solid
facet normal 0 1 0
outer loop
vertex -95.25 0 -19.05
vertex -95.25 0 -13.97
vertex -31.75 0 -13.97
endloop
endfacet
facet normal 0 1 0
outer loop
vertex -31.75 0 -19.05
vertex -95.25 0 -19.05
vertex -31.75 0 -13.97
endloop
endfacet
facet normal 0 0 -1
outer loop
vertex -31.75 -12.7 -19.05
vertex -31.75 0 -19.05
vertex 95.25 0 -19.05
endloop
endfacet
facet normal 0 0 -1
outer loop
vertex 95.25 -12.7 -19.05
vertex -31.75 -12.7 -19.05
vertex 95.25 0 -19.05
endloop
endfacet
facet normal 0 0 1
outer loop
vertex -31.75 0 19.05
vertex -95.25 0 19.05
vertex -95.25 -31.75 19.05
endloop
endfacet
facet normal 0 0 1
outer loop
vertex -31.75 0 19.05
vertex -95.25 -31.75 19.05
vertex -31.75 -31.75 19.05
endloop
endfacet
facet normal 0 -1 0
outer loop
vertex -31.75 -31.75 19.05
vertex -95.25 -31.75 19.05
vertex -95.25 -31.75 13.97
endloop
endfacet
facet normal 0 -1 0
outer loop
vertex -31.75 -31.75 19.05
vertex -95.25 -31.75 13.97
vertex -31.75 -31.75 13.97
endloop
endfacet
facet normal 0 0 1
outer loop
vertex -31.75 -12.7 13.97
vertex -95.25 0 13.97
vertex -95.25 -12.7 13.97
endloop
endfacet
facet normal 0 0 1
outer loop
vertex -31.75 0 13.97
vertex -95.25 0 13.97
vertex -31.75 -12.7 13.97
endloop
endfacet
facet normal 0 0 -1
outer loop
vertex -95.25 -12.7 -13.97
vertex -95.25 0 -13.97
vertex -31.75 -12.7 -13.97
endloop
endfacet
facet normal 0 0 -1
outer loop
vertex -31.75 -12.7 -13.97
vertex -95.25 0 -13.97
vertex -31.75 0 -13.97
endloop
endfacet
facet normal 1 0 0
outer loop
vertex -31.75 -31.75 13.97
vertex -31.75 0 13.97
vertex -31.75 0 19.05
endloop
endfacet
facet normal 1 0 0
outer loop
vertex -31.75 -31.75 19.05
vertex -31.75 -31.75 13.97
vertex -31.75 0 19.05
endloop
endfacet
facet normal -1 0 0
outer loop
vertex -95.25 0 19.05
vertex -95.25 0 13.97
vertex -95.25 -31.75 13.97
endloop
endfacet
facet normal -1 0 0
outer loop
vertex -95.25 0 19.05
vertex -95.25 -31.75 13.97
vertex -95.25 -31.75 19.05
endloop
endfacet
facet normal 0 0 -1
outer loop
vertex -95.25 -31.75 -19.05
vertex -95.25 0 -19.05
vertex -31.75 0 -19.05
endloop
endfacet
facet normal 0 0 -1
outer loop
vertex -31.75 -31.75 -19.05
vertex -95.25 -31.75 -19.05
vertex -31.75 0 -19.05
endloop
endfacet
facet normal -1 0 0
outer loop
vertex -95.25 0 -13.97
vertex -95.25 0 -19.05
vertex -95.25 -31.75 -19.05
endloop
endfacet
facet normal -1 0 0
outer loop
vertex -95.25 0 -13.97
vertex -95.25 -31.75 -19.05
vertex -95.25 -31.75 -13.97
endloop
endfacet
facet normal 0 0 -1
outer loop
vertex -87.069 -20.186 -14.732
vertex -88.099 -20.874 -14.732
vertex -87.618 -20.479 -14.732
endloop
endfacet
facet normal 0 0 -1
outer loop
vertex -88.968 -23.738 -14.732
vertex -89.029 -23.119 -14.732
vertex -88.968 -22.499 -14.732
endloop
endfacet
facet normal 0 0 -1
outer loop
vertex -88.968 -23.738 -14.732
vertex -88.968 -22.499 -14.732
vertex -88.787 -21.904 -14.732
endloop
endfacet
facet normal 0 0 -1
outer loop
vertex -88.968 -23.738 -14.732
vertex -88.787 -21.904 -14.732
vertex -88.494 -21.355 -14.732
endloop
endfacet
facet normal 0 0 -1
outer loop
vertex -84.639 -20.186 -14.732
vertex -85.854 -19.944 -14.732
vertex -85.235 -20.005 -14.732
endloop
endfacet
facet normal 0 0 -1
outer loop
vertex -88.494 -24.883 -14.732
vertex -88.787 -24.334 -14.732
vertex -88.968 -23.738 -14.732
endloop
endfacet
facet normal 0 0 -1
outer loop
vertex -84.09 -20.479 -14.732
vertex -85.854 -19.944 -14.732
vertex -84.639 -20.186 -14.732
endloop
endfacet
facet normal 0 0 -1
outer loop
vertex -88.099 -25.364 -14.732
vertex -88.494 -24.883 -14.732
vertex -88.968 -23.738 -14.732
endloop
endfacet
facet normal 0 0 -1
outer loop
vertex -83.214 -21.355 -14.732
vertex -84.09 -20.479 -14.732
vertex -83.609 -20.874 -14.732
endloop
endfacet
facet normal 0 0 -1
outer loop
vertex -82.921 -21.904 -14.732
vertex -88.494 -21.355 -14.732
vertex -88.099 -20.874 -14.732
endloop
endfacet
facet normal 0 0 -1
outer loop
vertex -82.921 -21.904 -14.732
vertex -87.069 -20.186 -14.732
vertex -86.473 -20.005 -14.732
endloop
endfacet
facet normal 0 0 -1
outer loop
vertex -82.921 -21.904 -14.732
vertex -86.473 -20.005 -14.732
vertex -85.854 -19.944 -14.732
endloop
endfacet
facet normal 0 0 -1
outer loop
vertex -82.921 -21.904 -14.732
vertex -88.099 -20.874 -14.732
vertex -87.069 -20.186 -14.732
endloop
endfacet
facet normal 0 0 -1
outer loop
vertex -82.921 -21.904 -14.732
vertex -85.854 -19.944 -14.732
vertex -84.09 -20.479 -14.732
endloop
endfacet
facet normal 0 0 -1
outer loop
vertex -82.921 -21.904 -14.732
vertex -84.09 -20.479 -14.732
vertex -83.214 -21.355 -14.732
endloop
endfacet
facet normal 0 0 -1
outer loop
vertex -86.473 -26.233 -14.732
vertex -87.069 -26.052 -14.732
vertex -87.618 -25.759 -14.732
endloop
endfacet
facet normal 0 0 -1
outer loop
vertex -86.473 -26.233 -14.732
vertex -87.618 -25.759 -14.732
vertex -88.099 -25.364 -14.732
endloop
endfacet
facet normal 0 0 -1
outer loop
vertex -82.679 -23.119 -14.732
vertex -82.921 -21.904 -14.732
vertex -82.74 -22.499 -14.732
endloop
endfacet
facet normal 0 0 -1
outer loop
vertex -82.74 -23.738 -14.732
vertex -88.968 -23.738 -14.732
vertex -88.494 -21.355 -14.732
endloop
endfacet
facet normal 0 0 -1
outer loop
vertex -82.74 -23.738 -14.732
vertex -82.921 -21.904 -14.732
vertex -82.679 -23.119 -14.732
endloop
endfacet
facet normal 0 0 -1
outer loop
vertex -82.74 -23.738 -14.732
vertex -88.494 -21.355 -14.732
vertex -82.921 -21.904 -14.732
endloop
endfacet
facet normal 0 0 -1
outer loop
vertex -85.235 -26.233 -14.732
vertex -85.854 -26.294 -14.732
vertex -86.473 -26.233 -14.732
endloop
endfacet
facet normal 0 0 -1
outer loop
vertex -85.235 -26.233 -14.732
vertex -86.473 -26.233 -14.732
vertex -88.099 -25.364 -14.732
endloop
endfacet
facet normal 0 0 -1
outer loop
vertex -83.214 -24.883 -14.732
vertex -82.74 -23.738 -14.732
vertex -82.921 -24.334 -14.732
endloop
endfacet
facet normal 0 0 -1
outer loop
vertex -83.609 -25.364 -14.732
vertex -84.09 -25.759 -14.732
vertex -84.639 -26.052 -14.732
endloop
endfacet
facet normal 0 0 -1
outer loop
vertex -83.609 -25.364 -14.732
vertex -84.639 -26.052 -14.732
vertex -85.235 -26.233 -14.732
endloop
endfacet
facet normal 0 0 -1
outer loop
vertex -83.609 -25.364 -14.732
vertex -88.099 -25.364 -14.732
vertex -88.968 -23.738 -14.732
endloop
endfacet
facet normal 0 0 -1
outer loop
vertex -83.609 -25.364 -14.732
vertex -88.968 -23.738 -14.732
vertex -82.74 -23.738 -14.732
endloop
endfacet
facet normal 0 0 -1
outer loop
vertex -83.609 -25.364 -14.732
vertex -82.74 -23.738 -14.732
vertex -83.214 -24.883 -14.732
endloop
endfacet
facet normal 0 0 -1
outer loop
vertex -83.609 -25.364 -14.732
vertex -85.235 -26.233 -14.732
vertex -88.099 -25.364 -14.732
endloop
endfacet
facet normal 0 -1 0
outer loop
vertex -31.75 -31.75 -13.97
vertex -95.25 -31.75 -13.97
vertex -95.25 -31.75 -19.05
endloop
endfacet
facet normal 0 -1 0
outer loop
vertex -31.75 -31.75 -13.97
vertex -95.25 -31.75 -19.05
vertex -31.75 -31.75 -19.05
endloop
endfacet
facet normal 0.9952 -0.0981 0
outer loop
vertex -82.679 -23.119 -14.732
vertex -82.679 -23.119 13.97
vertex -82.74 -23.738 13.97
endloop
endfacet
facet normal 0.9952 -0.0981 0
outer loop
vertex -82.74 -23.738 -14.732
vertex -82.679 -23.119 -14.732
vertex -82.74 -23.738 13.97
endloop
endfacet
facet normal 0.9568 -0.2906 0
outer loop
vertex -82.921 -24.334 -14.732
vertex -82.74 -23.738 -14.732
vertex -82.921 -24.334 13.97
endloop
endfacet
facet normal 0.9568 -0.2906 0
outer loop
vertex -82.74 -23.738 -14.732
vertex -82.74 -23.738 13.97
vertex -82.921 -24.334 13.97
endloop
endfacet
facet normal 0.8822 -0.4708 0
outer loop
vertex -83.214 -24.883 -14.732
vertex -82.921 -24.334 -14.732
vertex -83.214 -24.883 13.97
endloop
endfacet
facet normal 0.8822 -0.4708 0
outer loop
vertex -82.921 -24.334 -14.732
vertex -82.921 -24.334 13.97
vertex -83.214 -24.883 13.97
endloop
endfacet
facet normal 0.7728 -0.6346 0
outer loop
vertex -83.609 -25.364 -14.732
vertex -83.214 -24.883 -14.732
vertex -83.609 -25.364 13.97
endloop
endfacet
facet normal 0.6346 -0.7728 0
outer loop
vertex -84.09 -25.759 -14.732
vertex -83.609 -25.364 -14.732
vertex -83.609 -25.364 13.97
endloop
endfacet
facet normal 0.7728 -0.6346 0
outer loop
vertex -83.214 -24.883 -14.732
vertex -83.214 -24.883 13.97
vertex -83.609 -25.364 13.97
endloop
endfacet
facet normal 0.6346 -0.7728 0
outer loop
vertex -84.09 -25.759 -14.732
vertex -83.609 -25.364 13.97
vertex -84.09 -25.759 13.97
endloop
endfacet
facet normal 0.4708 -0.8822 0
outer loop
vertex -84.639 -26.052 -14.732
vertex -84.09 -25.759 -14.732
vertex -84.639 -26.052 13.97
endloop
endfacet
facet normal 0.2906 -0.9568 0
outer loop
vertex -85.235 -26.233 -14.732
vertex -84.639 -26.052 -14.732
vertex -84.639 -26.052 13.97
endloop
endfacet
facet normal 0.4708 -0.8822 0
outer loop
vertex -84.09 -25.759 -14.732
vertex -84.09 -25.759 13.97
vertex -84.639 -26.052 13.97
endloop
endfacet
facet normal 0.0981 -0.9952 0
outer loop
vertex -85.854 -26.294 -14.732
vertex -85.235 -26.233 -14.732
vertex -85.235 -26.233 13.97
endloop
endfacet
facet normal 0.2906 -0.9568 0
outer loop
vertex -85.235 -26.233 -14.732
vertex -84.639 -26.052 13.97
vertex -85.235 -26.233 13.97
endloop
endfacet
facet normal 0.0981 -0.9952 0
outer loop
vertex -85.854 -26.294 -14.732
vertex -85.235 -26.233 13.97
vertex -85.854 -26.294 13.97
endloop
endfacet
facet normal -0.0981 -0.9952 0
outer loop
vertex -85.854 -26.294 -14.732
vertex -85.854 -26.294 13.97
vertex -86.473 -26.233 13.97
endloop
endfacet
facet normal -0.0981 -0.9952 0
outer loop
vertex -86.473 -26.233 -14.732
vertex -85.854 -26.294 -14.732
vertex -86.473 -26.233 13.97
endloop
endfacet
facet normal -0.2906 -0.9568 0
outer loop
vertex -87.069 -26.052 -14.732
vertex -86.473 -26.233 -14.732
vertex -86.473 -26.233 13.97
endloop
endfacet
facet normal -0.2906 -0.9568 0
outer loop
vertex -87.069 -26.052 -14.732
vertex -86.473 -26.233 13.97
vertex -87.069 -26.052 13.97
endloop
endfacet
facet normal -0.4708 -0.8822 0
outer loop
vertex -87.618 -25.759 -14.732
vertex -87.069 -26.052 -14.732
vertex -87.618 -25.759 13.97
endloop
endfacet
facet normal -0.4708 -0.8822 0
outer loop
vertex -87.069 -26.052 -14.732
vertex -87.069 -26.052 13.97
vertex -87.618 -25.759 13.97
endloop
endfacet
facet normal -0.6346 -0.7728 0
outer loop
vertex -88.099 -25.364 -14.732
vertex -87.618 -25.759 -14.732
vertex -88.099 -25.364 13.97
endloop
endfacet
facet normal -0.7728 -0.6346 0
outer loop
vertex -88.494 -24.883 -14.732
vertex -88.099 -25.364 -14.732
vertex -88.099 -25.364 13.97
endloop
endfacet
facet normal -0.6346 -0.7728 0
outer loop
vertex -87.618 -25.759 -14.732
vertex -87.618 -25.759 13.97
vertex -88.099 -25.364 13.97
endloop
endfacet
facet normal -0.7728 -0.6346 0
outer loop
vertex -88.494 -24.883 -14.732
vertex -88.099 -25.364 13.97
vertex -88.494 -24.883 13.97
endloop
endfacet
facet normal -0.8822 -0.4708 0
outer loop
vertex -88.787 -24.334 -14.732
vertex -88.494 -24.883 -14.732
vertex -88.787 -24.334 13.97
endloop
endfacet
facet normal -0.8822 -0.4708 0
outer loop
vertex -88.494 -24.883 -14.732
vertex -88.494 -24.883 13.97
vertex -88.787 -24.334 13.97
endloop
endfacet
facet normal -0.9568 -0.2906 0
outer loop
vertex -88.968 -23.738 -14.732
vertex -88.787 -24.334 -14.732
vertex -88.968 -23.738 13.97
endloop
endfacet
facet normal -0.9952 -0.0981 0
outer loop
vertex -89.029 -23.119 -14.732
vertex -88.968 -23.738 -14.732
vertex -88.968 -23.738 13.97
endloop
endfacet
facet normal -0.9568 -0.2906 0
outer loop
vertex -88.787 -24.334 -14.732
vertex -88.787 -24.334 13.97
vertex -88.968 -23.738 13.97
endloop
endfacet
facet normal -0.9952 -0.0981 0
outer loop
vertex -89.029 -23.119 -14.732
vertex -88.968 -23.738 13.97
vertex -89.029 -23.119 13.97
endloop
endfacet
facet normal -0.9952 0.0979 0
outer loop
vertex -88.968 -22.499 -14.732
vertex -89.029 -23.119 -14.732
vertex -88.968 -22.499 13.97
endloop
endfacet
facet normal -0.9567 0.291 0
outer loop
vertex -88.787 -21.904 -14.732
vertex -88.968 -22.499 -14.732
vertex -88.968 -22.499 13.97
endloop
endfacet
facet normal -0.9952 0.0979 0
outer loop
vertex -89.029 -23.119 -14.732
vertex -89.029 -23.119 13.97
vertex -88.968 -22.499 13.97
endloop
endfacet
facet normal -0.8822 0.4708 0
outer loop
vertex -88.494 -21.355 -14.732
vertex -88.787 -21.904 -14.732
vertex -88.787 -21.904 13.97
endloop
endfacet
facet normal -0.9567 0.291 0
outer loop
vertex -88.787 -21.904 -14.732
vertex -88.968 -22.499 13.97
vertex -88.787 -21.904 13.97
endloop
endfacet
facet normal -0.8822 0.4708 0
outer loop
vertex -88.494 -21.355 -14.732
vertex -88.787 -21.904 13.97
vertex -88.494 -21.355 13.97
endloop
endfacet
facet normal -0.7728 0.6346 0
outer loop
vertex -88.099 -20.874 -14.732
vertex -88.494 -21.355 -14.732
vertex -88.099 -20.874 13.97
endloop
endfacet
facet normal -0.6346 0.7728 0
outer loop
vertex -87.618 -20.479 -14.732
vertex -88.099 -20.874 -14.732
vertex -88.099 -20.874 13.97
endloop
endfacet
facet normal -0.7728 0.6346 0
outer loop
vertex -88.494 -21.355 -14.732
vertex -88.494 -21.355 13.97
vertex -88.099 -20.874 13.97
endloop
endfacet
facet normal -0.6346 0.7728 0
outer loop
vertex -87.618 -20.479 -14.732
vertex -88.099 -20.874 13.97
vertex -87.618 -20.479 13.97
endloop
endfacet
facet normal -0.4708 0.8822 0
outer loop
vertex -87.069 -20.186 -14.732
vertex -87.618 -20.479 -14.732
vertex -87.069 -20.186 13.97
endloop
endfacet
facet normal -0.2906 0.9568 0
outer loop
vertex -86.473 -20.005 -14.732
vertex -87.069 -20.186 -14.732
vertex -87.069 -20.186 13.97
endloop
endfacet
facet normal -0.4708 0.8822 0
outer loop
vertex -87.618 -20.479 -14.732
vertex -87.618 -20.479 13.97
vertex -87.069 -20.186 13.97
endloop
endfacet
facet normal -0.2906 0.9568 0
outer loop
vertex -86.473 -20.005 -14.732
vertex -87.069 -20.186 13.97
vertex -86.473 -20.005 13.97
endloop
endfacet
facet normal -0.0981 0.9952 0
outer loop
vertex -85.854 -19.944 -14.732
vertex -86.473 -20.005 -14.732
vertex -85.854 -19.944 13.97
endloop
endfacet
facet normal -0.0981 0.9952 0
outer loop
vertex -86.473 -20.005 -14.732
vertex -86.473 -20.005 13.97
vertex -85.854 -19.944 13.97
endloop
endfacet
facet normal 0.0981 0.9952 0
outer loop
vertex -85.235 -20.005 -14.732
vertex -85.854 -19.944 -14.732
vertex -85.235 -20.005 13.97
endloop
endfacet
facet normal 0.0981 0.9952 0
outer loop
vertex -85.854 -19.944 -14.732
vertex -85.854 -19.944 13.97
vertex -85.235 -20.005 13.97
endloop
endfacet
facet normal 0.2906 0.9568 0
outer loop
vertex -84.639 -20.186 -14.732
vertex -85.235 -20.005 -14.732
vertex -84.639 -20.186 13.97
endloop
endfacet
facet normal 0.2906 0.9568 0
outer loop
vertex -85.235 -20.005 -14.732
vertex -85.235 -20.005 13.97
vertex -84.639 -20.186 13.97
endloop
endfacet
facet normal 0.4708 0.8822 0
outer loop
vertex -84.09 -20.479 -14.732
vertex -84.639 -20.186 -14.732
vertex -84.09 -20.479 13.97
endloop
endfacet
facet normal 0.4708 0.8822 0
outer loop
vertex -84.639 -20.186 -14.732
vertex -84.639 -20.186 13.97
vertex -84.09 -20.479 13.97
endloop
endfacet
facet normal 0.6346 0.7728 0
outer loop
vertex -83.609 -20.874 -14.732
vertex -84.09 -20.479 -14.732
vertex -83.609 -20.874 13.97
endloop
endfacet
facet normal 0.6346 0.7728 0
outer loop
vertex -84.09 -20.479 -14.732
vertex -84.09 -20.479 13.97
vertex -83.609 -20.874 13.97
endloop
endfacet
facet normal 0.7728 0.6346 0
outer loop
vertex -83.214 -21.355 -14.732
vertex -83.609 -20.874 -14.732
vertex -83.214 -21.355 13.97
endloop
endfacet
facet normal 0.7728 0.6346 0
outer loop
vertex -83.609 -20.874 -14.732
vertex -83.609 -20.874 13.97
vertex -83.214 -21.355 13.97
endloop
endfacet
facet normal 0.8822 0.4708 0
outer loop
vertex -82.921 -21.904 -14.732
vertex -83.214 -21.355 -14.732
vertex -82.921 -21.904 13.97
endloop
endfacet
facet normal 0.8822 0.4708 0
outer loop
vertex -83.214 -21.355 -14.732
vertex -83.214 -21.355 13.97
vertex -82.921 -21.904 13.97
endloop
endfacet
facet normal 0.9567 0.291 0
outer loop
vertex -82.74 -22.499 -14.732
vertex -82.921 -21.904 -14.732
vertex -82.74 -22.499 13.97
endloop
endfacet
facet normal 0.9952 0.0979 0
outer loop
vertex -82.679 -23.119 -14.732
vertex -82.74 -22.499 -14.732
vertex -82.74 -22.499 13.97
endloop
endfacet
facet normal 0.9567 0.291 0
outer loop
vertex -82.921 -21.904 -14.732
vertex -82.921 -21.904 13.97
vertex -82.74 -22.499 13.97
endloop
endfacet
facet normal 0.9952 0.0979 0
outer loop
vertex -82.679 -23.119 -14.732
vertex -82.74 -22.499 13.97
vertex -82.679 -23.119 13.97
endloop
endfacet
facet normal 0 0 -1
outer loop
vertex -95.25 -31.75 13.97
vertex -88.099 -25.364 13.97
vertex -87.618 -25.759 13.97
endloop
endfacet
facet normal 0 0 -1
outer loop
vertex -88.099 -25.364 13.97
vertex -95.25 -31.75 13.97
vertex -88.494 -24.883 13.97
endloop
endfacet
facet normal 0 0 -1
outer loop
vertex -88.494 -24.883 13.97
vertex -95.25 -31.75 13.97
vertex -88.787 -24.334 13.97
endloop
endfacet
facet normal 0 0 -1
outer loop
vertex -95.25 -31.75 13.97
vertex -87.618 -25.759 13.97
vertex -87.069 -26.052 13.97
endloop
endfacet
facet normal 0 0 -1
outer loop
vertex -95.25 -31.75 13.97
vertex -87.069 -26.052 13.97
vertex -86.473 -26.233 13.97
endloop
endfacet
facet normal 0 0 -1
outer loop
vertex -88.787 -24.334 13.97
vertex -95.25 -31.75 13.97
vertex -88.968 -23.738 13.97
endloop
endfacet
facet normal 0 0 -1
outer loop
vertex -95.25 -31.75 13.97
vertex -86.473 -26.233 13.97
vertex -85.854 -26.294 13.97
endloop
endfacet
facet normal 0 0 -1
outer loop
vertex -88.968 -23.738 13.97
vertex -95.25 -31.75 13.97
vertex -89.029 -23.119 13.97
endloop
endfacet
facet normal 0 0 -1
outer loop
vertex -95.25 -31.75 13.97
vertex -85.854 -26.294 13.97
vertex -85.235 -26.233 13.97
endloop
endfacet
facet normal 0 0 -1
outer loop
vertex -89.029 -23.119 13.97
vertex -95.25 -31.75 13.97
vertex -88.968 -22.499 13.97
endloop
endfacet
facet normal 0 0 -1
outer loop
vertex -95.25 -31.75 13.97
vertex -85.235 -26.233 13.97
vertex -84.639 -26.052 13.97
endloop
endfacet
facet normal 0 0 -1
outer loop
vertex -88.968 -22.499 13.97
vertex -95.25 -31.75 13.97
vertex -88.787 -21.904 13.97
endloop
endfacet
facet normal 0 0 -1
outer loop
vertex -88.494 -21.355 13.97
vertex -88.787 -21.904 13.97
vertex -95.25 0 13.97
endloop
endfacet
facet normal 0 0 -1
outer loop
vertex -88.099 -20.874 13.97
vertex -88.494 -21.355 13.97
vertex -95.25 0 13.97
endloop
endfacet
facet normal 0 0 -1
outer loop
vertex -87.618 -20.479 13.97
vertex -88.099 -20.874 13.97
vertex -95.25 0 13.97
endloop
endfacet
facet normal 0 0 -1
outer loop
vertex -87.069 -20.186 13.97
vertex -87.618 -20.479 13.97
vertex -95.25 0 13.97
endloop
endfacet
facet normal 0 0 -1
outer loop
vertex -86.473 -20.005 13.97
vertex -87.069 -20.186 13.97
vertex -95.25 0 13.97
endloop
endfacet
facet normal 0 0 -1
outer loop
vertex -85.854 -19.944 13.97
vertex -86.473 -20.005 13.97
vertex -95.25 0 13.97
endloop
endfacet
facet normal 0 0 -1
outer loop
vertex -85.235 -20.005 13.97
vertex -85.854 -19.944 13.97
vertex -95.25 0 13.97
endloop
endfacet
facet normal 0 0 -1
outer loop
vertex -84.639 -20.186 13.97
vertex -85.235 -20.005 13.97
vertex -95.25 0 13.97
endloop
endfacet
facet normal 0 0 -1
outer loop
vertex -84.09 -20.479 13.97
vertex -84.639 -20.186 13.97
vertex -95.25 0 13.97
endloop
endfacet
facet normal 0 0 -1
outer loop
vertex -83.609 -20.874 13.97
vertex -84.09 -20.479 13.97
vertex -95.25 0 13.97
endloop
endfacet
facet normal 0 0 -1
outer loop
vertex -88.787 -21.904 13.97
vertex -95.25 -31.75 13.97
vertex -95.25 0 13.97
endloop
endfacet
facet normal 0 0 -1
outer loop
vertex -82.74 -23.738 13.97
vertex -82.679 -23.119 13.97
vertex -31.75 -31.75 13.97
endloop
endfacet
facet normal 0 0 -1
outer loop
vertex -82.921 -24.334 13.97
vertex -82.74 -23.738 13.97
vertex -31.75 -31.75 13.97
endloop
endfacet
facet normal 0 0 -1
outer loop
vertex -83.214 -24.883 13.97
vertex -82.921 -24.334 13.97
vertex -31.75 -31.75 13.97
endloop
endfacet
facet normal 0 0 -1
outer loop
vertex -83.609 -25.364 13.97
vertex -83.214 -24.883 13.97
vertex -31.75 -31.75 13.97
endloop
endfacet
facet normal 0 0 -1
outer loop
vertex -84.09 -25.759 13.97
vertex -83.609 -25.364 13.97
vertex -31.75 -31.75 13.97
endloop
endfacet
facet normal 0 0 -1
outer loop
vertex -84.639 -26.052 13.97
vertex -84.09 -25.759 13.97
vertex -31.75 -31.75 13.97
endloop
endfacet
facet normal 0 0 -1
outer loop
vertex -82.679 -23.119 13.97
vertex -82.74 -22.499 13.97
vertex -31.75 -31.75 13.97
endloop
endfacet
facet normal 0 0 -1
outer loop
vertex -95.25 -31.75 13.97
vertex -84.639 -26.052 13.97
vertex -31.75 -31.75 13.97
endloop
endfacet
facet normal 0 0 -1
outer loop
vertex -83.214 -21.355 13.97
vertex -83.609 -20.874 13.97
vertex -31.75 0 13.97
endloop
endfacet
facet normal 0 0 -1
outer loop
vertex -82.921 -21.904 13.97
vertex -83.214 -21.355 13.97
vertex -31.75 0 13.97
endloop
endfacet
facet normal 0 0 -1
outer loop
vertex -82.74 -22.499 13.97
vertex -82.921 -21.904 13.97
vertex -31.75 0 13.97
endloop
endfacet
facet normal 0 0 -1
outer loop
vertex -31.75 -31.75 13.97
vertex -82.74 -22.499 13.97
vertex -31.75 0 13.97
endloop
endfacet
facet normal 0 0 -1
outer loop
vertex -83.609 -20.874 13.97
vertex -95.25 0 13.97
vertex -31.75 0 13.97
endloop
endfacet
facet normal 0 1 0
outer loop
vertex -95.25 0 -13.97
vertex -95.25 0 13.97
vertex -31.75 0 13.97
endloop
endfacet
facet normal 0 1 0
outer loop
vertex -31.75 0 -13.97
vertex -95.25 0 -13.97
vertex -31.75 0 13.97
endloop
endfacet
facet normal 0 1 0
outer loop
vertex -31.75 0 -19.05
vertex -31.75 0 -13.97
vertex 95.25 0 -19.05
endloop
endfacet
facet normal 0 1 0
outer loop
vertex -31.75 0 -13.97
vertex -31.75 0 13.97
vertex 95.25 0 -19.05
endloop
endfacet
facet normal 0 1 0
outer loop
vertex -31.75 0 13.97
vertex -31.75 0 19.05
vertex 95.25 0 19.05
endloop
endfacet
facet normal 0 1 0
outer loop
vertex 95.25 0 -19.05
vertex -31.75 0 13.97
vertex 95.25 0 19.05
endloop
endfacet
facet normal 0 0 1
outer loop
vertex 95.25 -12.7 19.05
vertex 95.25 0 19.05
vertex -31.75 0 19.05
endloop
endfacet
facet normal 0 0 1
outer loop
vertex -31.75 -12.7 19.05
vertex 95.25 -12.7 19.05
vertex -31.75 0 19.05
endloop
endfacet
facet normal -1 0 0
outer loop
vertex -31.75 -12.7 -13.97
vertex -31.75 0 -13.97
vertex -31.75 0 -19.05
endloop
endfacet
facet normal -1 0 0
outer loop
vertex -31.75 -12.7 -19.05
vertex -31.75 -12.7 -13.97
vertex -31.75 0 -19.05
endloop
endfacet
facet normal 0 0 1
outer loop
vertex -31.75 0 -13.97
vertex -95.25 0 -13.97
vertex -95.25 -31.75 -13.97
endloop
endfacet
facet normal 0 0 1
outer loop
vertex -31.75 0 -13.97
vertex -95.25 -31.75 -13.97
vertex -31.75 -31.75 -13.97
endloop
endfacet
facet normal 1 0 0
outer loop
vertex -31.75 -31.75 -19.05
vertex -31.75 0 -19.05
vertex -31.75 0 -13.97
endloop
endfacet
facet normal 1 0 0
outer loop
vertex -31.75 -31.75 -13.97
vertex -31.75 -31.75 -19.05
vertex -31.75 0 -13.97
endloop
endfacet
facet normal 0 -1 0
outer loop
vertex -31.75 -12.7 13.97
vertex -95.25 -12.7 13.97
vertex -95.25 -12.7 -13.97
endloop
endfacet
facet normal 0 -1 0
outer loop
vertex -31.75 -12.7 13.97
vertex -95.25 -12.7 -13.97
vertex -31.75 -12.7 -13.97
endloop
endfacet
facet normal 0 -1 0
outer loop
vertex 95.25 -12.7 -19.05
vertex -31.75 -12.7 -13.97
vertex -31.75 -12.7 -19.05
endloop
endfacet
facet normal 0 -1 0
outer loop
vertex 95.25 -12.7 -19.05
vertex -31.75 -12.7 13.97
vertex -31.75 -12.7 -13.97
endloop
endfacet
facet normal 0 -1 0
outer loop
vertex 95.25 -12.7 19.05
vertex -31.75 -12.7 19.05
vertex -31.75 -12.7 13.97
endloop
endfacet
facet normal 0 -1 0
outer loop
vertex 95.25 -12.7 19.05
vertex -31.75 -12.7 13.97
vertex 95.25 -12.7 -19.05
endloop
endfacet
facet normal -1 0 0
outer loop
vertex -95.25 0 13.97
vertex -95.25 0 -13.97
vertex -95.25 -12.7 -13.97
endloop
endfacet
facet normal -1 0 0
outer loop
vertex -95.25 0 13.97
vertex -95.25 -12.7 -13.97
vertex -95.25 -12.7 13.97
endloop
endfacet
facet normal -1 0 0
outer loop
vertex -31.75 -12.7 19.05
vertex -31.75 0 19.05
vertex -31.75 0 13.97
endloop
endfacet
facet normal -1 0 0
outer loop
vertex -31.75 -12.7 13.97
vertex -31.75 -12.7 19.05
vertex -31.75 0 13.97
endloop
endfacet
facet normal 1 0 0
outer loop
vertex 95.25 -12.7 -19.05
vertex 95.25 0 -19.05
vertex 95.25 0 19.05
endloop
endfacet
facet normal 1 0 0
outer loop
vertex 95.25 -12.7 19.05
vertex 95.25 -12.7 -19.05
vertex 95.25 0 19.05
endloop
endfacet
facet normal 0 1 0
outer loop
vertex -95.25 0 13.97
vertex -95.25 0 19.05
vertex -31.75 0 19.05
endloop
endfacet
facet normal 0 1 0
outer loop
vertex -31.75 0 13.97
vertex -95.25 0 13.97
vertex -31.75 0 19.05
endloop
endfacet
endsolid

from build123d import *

# Parameters (mm, degrees)
F0_W     = 63.5
F0_H     = 5.08
F1_DEPTH = 31.75
F0_H_2   = 27.94
F2_DEPTH = 12.7
F3_R     = 3.175
F4_DEPTH = 28.702


with BuildPart() as f1:
    # F0 (on Front) → F1 (new body)
    with BuildSketch(Plane.XZ):
        with Locations((-63.5, 16.51)):
            Rectangle(F0_W, F0_H)
    extrude(amount=F1_DEPTH)

    # F3 (on face) → F4 (join)
    with BuildSketch(Plane(origin=(0, 0, 13.97), x_dir=(1, 0, 0), z_dir=(0, 0, -1))):
        with Locations((-85.8540832996, 23.1188889593)):
            Circle(F3_R)
    extrude(amount=F4_DEPTH)


with BuildPart() as f1b:
    # F0 (on Front) → F1, piece 2 (new body)
    with BuildSketch(Plane.XZ):
        with Locations((-63.5, -16.51)):
            Rectangle(F0_W, F0_H)
    extrude(amount=F1_DEPTH)


with BuildPart() as f2:
    # F0 (on Front) → F2 (new body)
    with BuildSketch(Plane.XZ):
        with Locations((-63.5, 0)):
            Rectangle(F0_W, F0_H_2)
        Polygon((95.25, -19.05), (95.25, 19.05), (-31.75, 19.05), (-31.75, 13.97), (-31.75, -13.97), (-31.75, -19.05), align=None)
    extrude(amount=F2_DEPTH)


solid = Compound([f1.part, f1b.part, f2.part])
